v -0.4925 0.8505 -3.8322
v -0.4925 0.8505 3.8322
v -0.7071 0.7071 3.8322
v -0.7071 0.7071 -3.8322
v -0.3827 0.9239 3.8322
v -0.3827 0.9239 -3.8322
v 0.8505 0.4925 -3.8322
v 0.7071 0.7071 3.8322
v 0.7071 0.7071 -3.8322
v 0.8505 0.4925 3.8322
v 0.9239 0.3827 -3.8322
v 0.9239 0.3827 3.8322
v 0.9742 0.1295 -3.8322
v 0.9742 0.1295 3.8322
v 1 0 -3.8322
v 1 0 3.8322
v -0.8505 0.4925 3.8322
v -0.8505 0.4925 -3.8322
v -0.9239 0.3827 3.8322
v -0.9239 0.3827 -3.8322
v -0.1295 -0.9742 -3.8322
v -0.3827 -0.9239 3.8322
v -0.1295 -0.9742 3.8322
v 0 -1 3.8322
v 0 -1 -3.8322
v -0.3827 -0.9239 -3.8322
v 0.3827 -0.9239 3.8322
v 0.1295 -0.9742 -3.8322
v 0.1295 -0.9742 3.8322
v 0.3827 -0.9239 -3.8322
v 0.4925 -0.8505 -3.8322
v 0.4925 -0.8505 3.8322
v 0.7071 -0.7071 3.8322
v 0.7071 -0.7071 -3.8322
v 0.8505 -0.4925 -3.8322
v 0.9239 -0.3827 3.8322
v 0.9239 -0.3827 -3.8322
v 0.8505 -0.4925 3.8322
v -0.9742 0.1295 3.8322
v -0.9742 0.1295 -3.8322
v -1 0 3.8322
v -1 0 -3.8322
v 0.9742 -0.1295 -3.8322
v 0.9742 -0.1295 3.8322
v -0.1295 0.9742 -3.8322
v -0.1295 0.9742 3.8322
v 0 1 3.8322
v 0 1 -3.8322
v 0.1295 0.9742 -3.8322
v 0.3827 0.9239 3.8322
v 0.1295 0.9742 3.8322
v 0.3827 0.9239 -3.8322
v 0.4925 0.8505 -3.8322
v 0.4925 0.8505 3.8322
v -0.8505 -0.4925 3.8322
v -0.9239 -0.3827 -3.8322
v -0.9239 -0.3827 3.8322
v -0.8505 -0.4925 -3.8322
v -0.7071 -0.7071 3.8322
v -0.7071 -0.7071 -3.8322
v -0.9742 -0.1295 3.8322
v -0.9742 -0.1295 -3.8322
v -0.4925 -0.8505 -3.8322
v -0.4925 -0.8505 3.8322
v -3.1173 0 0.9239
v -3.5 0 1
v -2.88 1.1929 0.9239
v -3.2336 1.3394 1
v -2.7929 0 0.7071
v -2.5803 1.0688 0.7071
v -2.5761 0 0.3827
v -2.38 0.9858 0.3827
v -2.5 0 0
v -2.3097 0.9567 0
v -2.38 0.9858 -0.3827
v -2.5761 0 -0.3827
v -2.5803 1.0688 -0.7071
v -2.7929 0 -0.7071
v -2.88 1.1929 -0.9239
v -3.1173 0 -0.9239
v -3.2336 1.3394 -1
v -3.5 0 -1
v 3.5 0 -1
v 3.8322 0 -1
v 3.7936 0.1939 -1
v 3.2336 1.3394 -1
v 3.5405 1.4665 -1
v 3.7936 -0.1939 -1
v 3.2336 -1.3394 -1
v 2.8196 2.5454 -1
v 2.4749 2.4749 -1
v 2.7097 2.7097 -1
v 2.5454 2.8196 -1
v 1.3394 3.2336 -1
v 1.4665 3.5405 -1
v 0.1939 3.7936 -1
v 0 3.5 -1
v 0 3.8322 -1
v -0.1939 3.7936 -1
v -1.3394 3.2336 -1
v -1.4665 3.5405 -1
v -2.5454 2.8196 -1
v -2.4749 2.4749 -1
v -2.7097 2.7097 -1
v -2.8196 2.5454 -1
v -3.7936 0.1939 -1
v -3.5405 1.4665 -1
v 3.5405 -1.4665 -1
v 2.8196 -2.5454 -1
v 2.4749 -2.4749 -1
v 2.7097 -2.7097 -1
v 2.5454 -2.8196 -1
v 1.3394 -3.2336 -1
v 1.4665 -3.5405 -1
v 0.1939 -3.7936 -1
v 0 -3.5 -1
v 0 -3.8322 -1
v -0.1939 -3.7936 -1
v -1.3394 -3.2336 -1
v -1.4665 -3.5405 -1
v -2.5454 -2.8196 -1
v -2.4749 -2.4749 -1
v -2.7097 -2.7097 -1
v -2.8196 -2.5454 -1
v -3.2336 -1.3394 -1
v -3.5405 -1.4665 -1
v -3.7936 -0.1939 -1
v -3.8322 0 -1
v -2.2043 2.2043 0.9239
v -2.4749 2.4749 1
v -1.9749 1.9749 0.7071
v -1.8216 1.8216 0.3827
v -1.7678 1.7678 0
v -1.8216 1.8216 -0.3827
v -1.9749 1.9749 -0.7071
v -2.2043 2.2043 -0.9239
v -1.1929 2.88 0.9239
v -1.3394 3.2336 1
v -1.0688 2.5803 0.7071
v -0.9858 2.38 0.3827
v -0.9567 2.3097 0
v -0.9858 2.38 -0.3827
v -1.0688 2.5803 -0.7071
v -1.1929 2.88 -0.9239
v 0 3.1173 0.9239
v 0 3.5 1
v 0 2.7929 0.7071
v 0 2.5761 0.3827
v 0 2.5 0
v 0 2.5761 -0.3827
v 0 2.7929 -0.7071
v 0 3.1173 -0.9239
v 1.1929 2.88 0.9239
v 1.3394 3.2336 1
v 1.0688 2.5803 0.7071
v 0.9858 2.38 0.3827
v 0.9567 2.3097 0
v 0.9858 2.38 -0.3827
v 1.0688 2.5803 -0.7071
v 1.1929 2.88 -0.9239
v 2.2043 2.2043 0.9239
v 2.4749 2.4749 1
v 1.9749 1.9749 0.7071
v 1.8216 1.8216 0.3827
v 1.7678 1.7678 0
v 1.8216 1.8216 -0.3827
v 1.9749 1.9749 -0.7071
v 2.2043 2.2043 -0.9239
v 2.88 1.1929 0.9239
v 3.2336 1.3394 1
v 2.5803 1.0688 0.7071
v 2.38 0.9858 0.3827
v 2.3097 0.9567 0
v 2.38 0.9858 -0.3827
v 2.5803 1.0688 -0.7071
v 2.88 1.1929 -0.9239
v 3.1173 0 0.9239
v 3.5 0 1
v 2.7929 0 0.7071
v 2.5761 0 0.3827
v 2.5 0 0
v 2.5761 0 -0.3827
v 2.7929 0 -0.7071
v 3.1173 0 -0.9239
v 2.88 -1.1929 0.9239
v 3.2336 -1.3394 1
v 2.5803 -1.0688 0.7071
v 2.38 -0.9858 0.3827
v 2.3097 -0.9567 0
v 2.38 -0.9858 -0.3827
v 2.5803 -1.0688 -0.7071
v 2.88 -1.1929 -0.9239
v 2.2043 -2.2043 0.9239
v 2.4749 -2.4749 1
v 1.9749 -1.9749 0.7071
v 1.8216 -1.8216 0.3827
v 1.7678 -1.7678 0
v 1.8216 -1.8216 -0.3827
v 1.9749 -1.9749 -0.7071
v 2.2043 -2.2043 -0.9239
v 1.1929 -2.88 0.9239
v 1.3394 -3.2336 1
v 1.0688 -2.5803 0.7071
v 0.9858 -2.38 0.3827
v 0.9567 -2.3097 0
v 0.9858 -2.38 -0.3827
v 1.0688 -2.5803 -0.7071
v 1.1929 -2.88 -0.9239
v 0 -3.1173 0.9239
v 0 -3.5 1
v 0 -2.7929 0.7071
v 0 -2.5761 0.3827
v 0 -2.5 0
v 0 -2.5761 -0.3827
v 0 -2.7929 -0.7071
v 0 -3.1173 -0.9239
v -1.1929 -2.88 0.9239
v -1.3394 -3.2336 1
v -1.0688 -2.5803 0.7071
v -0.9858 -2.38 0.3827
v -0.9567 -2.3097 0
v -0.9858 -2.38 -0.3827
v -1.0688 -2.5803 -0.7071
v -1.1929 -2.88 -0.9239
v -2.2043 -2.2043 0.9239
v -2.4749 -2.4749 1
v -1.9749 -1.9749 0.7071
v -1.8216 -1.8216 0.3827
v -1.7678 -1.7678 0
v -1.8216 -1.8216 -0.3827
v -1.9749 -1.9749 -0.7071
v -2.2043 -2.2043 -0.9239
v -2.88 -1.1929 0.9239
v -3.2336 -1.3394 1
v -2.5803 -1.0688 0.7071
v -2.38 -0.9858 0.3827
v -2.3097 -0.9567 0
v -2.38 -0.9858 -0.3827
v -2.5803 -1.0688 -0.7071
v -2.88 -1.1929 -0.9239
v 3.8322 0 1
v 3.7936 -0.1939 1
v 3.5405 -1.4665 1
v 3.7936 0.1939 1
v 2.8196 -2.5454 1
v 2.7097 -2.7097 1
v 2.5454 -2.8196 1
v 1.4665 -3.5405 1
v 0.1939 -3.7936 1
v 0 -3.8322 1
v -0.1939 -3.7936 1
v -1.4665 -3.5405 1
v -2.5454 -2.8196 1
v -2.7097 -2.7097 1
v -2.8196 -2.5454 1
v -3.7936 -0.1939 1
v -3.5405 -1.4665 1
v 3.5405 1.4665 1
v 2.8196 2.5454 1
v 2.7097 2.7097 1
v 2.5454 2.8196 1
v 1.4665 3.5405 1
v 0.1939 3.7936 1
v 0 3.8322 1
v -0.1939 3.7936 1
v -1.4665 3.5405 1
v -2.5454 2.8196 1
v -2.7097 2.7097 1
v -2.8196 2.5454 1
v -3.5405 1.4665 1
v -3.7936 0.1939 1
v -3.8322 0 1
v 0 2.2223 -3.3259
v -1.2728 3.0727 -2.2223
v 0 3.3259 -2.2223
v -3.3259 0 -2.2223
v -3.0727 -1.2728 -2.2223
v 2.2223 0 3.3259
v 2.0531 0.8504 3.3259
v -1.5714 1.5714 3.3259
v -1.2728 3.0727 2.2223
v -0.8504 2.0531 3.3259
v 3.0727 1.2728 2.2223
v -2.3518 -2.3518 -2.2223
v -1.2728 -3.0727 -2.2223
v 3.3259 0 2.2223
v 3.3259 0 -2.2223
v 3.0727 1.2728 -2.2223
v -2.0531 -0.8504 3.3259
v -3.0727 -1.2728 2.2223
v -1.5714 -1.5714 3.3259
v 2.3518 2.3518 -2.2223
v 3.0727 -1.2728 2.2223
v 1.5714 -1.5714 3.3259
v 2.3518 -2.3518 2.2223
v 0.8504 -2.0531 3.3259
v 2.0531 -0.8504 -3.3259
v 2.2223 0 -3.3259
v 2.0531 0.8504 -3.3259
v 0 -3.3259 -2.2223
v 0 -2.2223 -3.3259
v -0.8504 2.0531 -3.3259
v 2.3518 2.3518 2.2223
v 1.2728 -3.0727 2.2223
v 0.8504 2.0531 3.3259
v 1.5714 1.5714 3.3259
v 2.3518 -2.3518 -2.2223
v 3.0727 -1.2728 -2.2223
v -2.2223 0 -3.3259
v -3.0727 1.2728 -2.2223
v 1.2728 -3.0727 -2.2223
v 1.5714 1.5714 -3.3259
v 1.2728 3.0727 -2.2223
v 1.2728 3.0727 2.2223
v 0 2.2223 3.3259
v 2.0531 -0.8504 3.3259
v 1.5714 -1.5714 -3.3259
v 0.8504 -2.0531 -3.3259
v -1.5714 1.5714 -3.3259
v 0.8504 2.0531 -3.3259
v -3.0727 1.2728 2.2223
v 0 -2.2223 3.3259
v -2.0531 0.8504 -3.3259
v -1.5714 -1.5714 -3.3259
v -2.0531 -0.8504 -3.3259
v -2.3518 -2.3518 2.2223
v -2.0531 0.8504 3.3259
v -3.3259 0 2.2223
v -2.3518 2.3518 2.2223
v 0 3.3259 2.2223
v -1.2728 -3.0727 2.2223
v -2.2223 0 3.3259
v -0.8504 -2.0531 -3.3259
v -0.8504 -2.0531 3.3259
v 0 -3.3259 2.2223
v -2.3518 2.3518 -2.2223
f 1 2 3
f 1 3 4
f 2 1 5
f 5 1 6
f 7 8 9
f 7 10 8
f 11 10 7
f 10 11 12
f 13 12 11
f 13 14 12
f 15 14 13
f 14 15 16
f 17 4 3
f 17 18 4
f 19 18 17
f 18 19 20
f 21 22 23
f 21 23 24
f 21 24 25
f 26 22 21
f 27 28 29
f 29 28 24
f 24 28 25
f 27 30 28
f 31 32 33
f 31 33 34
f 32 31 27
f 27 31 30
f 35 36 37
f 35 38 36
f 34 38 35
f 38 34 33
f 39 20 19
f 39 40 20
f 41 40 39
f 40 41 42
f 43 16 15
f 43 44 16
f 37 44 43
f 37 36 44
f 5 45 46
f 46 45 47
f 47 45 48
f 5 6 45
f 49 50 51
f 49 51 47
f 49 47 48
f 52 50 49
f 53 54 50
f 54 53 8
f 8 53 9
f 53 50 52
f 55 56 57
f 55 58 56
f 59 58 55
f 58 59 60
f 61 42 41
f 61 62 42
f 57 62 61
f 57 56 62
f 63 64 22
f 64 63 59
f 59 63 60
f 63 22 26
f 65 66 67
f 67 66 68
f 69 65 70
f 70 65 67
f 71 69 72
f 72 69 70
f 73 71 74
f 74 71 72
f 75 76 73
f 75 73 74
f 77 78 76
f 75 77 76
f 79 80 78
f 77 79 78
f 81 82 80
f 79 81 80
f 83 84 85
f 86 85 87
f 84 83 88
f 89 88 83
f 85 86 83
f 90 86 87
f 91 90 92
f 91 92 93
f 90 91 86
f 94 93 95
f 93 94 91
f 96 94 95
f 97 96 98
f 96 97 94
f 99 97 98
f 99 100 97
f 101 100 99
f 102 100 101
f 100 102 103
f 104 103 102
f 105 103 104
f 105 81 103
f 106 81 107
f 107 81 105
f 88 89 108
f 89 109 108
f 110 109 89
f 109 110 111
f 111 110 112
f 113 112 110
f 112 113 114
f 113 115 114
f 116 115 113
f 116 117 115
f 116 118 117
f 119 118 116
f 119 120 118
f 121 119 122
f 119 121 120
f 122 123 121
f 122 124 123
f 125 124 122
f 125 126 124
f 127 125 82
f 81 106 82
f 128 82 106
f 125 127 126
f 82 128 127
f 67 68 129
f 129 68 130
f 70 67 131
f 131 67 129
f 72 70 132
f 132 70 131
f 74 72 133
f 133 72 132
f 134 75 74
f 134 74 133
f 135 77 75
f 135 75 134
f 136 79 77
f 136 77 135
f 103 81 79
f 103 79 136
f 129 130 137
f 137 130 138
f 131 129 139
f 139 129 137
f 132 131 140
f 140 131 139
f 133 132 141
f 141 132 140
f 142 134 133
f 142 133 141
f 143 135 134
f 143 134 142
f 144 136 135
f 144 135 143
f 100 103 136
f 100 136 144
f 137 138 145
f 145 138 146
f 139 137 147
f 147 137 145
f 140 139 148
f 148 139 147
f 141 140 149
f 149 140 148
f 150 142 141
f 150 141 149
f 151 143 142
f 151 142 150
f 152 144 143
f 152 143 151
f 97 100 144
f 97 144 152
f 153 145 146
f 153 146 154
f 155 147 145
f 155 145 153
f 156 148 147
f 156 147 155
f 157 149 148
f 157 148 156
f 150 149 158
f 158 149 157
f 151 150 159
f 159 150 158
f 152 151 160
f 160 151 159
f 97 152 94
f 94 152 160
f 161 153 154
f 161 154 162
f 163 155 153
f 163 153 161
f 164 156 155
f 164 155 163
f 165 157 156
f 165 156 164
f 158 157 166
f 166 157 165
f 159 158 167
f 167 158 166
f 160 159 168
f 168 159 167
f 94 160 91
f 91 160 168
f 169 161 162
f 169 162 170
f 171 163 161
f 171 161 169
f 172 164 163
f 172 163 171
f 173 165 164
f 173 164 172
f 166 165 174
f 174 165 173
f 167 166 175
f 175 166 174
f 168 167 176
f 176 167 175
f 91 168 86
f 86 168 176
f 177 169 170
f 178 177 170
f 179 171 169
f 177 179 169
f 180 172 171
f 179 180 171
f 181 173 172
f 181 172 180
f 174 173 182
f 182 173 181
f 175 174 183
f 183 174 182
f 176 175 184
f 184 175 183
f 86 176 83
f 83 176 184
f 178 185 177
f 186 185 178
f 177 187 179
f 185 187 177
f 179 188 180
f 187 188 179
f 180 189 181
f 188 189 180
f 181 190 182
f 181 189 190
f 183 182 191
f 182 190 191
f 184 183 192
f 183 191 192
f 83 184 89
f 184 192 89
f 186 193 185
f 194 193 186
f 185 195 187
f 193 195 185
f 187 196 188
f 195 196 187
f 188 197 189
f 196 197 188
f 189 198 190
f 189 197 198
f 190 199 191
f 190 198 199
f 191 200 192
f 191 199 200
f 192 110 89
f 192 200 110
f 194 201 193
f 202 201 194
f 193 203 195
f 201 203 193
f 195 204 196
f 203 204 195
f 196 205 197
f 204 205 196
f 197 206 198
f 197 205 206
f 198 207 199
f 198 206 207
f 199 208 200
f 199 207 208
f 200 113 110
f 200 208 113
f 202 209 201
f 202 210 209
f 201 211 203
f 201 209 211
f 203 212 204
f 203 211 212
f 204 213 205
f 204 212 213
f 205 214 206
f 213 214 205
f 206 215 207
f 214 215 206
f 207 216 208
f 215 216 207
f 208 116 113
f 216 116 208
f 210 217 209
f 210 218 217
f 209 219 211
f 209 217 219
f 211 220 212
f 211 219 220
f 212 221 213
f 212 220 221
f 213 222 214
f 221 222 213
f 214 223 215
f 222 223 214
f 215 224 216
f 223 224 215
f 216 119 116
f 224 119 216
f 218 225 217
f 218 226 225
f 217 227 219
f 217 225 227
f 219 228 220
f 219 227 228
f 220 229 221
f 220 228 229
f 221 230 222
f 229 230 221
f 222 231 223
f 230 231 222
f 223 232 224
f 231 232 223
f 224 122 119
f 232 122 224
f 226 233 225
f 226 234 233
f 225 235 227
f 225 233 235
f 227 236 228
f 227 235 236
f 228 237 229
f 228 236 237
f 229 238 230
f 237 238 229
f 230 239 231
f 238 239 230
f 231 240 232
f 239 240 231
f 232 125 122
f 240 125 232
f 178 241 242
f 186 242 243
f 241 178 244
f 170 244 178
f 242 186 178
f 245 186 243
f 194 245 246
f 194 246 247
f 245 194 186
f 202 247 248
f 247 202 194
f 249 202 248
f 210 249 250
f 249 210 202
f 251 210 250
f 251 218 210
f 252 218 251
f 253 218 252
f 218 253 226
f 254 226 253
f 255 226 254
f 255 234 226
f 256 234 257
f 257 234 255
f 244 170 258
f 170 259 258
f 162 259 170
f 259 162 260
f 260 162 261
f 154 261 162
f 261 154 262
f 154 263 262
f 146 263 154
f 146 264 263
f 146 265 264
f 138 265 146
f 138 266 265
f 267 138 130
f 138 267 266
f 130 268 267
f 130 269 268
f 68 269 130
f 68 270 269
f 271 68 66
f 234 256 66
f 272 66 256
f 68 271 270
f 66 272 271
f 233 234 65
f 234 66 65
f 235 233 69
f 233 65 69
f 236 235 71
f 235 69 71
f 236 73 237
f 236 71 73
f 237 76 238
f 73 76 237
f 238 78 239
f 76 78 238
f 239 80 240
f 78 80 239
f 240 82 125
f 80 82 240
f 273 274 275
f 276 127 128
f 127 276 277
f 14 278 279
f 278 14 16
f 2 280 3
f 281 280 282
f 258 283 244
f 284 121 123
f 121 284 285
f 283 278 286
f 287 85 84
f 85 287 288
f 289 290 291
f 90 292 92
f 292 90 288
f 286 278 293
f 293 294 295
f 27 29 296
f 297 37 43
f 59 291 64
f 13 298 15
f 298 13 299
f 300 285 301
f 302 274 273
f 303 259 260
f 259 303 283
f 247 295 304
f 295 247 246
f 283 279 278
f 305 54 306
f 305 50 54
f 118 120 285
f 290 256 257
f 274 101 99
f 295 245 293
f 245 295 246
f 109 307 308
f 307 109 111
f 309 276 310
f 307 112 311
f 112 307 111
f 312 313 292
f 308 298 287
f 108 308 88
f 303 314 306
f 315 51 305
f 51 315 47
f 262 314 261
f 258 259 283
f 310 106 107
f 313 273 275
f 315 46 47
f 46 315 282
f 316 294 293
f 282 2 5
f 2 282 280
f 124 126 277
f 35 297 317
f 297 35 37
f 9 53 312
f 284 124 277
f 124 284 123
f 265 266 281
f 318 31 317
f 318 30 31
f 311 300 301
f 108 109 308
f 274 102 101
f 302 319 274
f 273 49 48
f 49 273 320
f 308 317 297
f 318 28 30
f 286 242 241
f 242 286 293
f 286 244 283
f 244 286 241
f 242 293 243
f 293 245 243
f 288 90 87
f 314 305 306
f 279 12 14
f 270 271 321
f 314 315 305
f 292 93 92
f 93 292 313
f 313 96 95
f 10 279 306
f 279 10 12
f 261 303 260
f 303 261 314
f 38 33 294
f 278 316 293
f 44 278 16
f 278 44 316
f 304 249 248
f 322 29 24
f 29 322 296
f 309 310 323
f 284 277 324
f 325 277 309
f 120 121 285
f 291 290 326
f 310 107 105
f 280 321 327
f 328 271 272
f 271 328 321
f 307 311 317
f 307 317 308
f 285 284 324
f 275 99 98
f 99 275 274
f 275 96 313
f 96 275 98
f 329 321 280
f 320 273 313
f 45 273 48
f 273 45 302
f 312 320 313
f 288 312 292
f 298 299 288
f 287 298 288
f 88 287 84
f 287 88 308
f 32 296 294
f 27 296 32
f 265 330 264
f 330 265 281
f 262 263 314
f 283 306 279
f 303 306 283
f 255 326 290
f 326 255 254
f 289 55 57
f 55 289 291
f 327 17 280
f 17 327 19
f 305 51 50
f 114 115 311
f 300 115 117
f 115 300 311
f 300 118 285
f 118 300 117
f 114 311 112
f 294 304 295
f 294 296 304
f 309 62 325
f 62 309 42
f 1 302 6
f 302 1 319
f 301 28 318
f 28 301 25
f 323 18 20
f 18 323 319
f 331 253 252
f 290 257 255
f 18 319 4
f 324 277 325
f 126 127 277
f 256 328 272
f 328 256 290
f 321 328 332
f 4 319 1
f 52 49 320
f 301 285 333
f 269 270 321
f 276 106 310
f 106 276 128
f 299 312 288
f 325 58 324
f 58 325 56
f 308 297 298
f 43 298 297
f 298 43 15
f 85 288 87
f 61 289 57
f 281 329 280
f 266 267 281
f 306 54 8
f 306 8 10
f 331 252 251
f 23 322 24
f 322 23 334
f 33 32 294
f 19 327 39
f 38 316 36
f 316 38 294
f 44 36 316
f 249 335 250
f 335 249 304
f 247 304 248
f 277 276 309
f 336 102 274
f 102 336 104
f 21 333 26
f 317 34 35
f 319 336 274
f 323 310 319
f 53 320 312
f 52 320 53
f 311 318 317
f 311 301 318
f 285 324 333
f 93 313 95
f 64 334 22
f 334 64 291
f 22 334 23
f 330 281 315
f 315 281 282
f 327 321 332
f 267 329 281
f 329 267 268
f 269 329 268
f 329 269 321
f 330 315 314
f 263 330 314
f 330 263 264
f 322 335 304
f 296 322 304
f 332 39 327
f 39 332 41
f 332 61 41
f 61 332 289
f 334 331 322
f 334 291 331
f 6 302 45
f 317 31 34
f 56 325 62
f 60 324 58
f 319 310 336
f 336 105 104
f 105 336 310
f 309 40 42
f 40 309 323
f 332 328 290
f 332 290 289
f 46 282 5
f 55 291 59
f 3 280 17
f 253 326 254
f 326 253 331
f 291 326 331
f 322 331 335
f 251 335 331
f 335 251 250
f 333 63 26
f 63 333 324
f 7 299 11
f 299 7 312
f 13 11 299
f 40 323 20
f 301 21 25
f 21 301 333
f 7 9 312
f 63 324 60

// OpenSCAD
bead_radius=4;
bead_slit_radius=1;
bead_slit_depth=1.5;
bead_hole_radius=1;
$fn=16;
module bead_base() {
    sphere(bead_radius);
}
module bead_hole() {
    cylinder(h=bead_radius*2, r=bead_hole_radius, center=true);
}
module bead_slit() {
    rotate_extrude(){
        translate([bead_radius-bead_slit_depth+bead_slit_radius, 0, 0]) circle(bead_slit_radius);
        translate([bead_radius-bead_slit_depth + 2*bead_slit_radius, 0, 0]) square(bead_slit_radius*2, center=true);
    }
    
}

module bead(){
    difference() {
        bead_base();
        union() {
            bead_hole();
            bead_slit();
        }
    }
}
bead();
        
